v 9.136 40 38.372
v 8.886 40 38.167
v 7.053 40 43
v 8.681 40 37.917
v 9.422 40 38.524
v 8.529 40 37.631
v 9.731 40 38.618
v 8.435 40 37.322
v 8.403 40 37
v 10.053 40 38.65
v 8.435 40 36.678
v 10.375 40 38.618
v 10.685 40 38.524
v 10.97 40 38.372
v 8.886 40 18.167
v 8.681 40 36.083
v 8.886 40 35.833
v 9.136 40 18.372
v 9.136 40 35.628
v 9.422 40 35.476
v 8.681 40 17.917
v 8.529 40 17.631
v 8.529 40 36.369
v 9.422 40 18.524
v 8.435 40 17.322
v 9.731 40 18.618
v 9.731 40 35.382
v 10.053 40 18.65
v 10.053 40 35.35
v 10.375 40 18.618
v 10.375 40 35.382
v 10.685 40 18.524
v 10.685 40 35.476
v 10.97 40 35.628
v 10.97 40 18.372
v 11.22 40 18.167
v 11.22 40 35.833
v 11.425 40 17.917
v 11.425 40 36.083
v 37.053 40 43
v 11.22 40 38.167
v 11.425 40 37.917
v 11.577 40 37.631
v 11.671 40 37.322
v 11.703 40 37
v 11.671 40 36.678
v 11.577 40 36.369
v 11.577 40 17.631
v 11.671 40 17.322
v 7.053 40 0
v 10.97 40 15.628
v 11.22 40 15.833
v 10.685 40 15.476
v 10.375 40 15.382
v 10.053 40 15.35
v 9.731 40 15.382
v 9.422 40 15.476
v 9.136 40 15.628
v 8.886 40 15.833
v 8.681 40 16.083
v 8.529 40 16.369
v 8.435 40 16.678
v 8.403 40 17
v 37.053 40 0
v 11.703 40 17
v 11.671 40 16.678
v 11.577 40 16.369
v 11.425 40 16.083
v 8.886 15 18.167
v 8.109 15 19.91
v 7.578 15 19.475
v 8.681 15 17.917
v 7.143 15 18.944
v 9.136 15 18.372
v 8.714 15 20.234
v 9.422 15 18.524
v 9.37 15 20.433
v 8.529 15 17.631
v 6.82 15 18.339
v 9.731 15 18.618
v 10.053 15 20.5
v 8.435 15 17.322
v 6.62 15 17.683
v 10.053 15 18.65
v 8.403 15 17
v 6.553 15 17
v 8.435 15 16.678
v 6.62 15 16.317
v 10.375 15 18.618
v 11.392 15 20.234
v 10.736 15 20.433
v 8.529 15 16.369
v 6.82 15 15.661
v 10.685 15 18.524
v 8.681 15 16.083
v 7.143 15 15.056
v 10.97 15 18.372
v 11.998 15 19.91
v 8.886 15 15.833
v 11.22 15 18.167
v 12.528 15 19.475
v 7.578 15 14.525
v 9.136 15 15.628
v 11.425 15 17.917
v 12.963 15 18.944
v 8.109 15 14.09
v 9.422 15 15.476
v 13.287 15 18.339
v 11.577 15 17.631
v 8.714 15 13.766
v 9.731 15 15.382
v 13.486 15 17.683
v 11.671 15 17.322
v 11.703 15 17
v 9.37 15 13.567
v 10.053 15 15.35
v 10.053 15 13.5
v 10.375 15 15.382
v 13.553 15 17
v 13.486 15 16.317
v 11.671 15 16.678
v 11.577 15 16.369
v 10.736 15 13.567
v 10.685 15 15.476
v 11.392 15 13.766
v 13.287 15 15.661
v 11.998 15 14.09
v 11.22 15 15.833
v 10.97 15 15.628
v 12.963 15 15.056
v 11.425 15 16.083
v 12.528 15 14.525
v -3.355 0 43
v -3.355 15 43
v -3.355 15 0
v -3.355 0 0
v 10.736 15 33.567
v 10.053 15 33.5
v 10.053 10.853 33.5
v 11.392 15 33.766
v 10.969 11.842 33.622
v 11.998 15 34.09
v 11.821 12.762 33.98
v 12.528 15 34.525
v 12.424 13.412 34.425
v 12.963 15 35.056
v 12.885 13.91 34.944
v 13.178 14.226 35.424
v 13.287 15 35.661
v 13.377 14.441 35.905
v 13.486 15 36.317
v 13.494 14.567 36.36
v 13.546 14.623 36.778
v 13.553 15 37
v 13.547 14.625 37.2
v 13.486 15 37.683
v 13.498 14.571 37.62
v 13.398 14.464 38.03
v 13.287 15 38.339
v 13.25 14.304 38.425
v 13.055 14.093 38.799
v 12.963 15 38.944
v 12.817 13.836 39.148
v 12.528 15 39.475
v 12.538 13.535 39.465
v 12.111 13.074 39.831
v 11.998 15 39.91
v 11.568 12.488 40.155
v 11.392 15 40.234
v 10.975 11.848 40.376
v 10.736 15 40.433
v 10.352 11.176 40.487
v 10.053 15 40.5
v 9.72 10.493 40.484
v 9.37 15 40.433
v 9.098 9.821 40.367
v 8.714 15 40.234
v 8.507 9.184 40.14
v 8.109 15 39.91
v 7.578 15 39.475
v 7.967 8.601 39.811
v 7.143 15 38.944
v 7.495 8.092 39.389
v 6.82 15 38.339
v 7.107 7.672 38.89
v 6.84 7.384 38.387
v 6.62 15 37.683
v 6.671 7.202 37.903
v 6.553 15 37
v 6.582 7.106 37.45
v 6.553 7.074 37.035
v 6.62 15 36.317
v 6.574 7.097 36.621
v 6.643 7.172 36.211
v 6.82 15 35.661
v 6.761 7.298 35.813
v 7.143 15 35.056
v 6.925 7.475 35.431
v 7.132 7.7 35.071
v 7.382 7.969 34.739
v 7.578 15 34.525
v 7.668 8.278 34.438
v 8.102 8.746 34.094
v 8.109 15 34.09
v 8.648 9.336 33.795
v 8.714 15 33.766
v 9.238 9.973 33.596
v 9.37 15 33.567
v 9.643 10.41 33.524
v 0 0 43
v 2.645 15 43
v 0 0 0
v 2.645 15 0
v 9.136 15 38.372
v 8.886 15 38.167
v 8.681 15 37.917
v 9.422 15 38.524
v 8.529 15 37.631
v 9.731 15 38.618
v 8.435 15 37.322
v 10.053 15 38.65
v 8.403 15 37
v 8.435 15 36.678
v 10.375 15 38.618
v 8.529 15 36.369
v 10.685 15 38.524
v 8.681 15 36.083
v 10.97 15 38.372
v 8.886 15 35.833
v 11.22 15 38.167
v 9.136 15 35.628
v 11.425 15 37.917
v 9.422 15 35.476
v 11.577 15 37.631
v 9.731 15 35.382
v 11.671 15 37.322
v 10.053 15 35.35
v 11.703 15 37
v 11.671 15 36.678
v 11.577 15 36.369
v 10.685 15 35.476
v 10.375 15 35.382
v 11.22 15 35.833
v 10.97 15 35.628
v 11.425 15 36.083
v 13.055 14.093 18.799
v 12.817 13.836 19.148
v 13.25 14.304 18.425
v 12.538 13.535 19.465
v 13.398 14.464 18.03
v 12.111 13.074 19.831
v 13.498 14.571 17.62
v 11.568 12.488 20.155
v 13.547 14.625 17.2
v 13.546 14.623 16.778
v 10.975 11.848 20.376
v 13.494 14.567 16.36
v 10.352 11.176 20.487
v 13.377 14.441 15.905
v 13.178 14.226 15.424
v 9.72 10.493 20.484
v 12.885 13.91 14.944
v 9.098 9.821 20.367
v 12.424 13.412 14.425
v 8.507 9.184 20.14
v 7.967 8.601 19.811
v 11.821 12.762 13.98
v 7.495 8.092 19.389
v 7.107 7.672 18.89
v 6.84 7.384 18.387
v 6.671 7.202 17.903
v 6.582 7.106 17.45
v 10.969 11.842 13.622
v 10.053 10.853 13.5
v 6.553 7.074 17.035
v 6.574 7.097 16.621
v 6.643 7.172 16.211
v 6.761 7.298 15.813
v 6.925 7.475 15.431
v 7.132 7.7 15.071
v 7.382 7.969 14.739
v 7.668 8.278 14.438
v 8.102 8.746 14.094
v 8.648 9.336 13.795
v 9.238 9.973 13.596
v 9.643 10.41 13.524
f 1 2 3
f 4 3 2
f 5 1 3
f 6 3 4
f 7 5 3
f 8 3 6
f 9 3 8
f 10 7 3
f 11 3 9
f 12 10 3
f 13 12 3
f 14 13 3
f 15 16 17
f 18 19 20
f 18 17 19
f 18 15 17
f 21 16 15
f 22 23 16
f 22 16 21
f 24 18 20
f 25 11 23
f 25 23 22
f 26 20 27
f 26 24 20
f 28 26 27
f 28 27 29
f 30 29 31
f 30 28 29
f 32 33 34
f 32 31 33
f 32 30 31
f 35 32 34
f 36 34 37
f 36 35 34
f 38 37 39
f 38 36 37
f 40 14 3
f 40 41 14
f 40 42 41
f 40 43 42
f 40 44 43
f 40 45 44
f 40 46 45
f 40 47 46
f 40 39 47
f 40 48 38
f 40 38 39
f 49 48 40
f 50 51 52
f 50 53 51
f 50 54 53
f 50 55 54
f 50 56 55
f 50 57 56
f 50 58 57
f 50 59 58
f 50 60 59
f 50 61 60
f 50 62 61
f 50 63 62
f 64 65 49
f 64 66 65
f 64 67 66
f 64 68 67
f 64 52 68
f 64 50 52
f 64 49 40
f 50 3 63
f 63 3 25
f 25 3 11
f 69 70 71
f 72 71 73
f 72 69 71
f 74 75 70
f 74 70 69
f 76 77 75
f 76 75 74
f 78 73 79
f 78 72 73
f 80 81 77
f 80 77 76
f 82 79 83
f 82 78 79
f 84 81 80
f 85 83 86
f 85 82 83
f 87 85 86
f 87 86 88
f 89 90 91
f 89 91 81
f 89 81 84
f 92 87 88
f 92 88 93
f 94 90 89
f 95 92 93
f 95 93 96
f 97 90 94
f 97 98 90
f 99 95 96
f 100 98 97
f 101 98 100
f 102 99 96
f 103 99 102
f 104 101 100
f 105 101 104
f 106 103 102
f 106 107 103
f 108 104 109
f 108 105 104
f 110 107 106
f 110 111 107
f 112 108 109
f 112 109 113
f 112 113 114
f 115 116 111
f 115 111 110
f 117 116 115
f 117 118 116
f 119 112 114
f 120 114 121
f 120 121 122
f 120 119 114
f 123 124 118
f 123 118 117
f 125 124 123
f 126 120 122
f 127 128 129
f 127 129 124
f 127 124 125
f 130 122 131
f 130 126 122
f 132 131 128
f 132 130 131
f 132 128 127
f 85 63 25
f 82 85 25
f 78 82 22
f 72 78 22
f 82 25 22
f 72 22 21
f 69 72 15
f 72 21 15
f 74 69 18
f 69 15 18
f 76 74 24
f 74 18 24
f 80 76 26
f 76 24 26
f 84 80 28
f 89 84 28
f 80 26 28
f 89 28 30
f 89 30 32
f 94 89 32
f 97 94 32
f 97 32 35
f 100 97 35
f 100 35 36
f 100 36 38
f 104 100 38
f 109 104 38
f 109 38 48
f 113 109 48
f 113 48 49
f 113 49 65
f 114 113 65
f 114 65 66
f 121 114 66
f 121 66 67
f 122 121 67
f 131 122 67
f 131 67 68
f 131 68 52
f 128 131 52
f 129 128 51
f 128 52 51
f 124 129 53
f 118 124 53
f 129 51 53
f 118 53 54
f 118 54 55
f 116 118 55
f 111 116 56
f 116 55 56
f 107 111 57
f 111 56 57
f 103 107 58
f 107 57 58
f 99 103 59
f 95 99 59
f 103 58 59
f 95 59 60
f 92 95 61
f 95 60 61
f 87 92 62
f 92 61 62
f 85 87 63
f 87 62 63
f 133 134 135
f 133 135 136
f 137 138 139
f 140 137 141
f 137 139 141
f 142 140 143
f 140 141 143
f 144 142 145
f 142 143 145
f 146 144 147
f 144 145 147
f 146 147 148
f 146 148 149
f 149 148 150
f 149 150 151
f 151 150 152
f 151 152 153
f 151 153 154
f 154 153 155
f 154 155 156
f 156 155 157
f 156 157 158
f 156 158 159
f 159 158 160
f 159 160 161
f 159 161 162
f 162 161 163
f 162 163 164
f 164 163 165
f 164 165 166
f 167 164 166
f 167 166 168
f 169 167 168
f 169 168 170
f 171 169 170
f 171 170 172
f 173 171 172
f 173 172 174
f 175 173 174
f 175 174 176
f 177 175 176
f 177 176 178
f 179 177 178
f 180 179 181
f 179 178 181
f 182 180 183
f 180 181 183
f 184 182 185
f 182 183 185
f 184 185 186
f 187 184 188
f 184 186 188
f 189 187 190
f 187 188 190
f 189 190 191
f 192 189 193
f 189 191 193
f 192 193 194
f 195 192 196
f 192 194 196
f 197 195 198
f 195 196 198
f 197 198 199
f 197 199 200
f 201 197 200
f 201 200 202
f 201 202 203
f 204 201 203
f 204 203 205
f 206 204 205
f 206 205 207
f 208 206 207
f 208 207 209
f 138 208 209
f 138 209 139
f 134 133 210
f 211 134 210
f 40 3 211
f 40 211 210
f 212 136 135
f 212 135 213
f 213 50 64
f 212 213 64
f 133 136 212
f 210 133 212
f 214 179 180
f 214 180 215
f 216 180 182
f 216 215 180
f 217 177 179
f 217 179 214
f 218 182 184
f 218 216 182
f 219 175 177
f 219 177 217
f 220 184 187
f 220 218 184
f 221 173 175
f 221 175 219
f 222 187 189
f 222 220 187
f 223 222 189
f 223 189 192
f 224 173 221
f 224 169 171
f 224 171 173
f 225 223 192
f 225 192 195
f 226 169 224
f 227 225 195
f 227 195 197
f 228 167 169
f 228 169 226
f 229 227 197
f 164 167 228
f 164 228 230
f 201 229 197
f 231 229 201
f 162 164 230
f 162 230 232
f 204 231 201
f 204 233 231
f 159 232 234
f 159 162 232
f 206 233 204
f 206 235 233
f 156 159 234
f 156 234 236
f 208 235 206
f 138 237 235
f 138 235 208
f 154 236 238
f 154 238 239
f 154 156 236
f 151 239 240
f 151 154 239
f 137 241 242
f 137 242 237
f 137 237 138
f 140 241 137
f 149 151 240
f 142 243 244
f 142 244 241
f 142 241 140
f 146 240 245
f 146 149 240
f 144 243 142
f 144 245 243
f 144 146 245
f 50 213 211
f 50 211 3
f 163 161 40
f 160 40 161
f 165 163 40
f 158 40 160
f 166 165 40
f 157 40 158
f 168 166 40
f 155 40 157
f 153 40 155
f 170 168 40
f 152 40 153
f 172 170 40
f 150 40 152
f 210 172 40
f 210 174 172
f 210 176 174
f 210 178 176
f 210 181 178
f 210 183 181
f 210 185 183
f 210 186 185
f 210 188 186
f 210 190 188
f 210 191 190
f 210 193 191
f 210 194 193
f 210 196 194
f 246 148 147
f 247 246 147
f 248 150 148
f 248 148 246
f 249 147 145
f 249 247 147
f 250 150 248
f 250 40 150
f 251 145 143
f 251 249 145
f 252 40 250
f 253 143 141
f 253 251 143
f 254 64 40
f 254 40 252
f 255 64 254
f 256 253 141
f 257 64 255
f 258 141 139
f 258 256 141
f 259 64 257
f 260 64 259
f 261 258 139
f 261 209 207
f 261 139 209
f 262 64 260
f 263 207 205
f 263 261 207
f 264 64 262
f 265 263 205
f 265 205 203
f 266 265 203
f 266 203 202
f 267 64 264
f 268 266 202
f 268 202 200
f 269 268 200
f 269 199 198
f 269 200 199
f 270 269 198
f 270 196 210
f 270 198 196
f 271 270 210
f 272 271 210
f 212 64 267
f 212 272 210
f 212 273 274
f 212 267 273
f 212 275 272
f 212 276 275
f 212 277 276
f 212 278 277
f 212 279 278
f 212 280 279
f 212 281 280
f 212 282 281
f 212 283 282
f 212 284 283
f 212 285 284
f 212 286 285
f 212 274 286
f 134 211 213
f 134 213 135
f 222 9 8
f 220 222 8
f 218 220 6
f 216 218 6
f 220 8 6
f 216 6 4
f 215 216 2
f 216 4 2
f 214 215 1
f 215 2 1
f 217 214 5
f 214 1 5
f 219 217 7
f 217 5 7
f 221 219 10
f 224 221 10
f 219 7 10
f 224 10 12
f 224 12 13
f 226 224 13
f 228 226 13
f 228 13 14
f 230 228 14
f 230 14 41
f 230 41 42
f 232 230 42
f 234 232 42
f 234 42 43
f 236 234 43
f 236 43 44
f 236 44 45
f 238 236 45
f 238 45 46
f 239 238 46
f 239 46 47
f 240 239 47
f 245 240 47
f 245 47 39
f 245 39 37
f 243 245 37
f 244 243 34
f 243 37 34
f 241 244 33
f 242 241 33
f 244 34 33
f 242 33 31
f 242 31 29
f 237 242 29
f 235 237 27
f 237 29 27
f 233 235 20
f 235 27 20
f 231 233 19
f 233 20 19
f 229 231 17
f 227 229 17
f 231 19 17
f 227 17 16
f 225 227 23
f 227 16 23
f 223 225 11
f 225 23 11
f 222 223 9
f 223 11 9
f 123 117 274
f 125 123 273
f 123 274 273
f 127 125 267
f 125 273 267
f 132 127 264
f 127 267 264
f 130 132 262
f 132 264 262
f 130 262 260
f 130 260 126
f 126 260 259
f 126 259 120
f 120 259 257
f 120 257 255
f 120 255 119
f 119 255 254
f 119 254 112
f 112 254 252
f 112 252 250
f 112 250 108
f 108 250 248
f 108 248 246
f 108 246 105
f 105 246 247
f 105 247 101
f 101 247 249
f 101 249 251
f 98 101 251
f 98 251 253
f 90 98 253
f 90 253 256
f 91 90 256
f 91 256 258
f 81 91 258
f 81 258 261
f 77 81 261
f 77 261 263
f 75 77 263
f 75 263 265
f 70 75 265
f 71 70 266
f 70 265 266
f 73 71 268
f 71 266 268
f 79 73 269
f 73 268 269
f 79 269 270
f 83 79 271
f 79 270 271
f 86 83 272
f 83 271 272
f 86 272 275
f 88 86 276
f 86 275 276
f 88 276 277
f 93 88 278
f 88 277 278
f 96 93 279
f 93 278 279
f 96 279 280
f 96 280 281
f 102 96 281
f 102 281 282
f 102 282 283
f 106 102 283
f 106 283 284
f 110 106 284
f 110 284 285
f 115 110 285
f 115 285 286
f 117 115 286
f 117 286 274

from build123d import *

# Parameters (mm, degrees)
EXTRUDE_1_DEPTH     = 43
SKETCH_2_R          = 1.65
CUT_EXTRUDE_1_DEPTH = 40
EXTRUDE_2_DEPTH     = 43
SKETCH_4_R          = 3.5
CUT_EXTRUDE_2_DEPTH = 15


with BuildPart() as part:
    # 草图1 → 凸台-拉伸1 (new body)
    with BuildSketch(Plane.XY):
        Polygon((0, 0), (7.053079228, 40), (37.053079228, 40), align=None)
    extrude(amount=EXTRUDE_1_DEPTH)

    # 草图2 → 切除-拉伸1 (cut)
    with BuildSketch(Plane(origin=(0, 40, 0), x_dir=(1, 0, 0), z_dir=(0, 1, 0))):
        with Locations(Location((10.053079228, -17, 0), (0, 0, 180))):
            Circle(SKETCH_2_R)
        with Locations(Location((10.053079228, -37, 0), (0, 0, 180))):
            Circle(SKETCH_2_R)
    extrude(amount=-CUT_EXTRUDE_1_DEPTH, mode=Mode.SUBTRACT)

    # 草图3 → 凸台-拉伸2 (add)
    with BuildSketch(Plane.XY.offset(43)):
        Polygon((2.644904711, 15), (-3.355095289, 15), (-3.355095289, 0), (0, 0), align=None)
    extrude(amount=-EXTRUDE_2_DEPTH)

    # 草图4 → 切除-拉伸2 (cut)
    with BuildSketch(Plane.XZ):
        with Locations(Location((10.053079228, 37, 0), (0, 0, 270))):
            Circle(SKETCH_4_R)
        with Locations(Location((10.053079228, 17, 0), (0, 0, 270))):
            Circle(SKETCH_4_R)
    extrude(amount=-CUT_EXTRUDE_2_DEPTH, mode=Mode.SUBTRACT)


solid = part.part
